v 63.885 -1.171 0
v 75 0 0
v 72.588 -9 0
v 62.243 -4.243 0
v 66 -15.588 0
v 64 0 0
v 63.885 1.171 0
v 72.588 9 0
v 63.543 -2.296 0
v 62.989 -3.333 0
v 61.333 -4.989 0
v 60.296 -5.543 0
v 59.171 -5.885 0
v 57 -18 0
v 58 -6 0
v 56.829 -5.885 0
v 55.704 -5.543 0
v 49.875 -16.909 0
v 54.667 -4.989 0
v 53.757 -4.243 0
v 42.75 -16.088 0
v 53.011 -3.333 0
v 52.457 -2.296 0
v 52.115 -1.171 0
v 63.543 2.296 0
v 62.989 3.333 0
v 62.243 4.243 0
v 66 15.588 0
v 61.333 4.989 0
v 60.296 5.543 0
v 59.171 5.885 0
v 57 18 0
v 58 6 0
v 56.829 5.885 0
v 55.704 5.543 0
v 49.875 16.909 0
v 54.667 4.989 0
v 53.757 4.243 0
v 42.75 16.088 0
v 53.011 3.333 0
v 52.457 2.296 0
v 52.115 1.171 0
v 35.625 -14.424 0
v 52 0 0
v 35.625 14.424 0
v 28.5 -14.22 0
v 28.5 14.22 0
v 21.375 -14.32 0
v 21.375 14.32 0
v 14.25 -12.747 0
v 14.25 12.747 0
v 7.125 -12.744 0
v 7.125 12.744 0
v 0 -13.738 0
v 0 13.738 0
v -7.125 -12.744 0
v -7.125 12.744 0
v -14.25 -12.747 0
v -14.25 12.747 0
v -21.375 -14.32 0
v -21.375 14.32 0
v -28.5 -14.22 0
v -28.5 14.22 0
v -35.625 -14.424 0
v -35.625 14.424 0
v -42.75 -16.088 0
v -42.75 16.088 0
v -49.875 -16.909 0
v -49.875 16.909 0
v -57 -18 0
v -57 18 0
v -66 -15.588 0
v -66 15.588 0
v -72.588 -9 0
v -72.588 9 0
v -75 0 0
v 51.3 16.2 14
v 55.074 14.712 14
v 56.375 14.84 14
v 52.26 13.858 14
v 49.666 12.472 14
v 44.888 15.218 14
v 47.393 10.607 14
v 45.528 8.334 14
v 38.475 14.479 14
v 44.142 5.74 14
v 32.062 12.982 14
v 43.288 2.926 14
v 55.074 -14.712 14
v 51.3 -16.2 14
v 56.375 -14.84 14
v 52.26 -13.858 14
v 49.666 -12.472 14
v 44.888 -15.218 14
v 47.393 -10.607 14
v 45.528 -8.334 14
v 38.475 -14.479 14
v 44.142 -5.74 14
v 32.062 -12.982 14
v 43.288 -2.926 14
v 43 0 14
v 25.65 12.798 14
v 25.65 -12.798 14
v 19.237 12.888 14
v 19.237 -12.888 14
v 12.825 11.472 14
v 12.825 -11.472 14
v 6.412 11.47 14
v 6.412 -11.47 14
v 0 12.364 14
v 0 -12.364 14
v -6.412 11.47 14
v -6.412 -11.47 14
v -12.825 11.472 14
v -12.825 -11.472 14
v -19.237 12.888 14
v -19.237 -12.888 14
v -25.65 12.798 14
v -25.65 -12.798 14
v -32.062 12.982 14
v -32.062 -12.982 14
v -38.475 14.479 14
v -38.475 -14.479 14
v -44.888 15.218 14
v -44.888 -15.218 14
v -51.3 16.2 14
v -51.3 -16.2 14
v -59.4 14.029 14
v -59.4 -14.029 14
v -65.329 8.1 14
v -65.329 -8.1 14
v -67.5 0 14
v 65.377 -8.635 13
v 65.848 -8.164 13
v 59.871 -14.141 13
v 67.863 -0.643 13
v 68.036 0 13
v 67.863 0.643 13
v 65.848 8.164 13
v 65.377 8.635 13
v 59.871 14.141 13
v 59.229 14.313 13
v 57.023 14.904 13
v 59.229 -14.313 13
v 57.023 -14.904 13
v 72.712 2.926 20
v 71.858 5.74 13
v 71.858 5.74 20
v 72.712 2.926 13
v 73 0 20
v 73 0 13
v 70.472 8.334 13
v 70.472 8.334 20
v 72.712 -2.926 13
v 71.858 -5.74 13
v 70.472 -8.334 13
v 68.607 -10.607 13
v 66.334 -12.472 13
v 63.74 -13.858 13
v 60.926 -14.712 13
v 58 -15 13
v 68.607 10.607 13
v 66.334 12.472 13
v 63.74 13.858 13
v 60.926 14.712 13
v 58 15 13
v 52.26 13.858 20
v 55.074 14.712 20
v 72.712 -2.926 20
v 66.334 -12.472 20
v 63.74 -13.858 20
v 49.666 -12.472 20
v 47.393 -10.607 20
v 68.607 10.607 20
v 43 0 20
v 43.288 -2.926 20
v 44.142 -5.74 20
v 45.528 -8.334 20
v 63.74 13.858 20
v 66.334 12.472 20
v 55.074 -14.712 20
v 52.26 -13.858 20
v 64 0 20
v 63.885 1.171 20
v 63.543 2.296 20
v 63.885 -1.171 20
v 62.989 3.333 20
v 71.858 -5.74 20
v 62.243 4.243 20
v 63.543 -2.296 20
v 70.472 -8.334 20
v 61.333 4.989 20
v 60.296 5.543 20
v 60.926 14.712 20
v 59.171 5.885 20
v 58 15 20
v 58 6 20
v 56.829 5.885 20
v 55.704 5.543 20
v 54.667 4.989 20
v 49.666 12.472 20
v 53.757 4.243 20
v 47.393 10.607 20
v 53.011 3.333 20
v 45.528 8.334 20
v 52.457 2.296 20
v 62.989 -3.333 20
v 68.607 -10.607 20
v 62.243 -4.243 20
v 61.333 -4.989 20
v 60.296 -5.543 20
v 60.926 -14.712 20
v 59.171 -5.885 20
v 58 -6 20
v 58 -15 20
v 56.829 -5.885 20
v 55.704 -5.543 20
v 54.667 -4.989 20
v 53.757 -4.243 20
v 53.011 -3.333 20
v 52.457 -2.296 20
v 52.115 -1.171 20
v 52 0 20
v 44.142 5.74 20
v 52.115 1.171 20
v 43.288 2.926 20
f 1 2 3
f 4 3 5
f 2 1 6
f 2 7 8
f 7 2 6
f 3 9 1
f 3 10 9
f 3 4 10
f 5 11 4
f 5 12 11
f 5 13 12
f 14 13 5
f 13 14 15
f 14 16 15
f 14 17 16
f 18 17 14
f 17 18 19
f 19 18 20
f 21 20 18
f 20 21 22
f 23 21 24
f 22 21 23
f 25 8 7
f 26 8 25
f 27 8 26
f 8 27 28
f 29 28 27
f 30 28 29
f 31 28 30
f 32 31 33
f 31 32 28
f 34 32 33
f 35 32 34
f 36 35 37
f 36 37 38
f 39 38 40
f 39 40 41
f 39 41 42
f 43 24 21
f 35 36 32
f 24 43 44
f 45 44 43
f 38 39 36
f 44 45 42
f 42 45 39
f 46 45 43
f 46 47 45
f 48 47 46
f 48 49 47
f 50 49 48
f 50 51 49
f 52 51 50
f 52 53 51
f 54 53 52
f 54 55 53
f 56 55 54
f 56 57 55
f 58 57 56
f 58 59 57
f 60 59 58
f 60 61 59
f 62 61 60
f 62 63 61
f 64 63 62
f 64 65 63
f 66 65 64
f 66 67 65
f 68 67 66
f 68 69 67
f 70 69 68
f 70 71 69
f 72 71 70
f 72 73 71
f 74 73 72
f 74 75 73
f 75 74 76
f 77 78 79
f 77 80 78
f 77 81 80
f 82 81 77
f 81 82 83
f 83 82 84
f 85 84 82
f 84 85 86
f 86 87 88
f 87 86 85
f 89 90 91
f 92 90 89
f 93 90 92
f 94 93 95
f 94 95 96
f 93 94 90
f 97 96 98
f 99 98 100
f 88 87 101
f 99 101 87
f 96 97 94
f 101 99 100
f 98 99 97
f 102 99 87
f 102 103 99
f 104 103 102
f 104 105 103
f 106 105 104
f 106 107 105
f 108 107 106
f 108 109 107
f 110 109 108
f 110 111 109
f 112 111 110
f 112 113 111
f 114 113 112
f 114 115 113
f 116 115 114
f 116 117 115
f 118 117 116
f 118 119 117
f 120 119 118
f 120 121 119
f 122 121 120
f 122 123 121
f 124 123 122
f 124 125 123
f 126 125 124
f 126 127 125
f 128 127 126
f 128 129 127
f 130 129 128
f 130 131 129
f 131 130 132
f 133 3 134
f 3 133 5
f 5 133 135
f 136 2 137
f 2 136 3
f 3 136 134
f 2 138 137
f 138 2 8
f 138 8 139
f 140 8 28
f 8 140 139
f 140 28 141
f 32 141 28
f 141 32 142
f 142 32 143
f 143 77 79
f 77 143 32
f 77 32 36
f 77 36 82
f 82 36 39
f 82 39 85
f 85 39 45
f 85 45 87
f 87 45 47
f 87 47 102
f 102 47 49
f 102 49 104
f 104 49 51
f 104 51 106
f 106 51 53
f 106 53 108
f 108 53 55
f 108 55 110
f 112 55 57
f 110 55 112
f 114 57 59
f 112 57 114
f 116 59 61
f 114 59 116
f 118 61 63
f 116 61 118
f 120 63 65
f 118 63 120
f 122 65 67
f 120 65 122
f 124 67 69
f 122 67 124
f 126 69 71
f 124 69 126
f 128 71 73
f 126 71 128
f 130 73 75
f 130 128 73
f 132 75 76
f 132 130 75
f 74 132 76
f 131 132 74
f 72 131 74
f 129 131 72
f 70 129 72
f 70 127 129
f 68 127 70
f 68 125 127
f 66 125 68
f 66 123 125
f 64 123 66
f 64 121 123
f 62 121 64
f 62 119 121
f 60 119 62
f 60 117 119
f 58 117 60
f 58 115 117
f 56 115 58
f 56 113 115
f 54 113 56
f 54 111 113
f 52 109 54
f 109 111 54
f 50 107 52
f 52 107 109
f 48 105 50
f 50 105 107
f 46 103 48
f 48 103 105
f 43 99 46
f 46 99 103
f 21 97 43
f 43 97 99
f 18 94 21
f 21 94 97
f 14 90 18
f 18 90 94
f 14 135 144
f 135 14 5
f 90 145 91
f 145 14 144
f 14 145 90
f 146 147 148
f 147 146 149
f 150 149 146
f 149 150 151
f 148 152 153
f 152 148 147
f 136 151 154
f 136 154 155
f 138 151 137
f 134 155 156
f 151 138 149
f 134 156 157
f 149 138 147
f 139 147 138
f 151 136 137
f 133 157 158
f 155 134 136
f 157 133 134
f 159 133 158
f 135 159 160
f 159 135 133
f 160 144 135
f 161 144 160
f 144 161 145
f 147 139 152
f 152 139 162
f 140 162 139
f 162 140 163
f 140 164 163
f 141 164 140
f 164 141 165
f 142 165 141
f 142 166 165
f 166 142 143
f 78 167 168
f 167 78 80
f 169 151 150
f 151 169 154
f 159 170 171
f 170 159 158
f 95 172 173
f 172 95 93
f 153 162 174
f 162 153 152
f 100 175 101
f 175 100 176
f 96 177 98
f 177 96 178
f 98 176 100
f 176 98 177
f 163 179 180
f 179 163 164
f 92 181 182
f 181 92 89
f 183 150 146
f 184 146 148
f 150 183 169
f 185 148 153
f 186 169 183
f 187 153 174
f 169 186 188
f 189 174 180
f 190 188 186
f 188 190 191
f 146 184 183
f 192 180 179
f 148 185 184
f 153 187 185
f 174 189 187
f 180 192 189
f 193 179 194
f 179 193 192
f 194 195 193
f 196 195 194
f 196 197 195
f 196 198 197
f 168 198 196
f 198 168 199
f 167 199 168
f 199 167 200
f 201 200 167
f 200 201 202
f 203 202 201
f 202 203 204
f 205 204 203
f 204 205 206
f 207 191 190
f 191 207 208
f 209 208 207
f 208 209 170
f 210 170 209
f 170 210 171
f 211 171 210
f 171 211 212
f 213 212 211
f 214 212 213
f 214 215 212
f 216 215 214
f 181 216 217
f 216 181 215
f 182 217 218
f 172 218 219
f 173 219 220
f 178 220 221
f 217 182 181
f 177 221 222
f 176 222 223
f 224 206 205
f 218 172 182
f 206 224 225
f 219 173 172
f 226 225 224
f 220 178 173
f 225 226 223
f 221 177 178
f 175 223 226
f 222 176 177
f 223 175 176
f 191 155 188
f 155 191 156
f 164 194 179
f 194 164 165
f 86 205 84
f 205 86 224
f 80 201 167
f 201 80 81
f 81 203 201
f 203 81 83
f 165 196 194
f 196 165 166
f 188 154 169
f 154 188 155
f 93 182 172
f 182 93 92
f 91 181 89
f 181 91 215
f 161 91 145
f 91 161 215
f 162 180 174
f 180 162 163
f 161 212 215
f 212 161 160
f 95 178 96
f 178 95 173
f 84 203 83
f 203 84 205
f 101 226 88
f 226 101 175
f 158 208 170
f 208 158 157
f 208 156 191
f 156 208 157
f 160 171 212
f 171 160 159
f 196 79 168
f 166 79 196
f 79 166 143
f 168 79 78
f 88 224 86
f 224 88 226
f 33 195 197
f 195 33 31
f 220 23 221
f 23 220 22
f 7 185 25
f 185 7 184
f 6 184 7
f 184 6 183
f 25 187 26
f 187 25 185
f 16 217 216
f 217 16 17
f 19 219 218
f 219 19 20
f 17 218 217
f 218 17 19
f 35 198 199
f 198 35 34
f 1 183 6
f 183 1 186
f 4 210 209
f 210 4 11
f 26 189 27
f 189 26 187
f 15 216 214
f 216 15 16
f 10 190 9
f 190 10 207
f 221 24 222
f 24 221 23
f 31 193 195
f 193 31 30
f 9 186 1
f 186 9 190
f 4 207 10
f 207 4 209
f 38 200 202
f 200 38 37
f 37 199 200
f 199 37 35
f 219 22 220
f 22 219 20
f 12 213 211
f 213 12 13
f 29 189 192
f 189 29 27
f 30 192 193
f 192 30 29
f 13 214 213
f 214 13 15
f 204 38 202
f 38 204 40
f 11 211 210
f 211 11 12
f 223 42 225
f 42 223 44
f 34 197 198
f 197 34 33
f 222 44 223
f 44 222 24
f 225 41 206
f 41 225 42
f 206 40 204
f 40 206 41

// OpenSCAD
$fn = 32;

// ----------------------------------------------------------------------
// Handle: 150 x 36 mm grip, 14 mm thick
// ----------------------------------------------------------------------

// --- parameters (mm) ---
length = 150;             // grip length
width = 36;               // grip width
thickness = 14;           // grip thickness
waist = 0.72;             // width factor at the middle
draft = 0.9;              // top face scale of the extrusion
scallops = 5;             // finger rests per side
ripple = 0.06;            // depth factor of the finger rests
boss_d = 30;              // mounting boss diameter
boss_h = 6;               // mounting boss height
boss_hole_d = 12;         // screw clearance through the boss
boss_r = 58;              // boss centre from the grip centre

/* ergonomic grip outline, closed spline-like polygon in the XY plane */
grip = [[-57, 18], [-49.875, 16.909], [-42.75, 16.088], [-35.625, 14.424], [-28.5, 14.22], [-21.375, 14.32], [-14.25, 12.747], [-7.125, 12.744], [0, 13.738], [7.125, 12.744], [14.25, 12.747], [21.375, 14.32], [28.5, 14.22], [35.625, 14.424], [42.75, 16.088], [49.875, 16.909], [57, 18], [66, 15.588], [72.588, 9], [75, 0], [72.588, -9], [66, -15.588], [57, -18], [57, -18], [49.875, -16.909], [42.75, -16.088], [35.625, -14.424], [28.5, -14.22], [21.375, -14.32], [14.25, -12.747], [7.125, -12.744], [0, -13.738], [-7.125, -12.744], [-14.25, -12.747], [-21.375, -14.32], [-28.5, -14.22], [-35.625, -14.424], [-42.75, -16.088], [-49.875, -16.909], [-57, -18], [-66, -15.588], [-72.588, -9], [-75, 0], [-72.588, 9], [-66, 15.588], [-57, 18]];

module grip_body() {
  linear_extrude(height = thickness, scale = draft) polygon(grip);
}

module boss_body() {
  /* sunk 1 mm into the grip so the joint overlaps */
  translate([boss_r, 0, thickness - 1]) cylinder(h = boss_h + 1, d = boss_d);
}

difference() {
  union() {
    grip_body();
    boss_body();
  }
  translate([boss_r, 0, -1]) cylinder(h = thickness + boss_h + 2, d = boss_hole_d);
}
